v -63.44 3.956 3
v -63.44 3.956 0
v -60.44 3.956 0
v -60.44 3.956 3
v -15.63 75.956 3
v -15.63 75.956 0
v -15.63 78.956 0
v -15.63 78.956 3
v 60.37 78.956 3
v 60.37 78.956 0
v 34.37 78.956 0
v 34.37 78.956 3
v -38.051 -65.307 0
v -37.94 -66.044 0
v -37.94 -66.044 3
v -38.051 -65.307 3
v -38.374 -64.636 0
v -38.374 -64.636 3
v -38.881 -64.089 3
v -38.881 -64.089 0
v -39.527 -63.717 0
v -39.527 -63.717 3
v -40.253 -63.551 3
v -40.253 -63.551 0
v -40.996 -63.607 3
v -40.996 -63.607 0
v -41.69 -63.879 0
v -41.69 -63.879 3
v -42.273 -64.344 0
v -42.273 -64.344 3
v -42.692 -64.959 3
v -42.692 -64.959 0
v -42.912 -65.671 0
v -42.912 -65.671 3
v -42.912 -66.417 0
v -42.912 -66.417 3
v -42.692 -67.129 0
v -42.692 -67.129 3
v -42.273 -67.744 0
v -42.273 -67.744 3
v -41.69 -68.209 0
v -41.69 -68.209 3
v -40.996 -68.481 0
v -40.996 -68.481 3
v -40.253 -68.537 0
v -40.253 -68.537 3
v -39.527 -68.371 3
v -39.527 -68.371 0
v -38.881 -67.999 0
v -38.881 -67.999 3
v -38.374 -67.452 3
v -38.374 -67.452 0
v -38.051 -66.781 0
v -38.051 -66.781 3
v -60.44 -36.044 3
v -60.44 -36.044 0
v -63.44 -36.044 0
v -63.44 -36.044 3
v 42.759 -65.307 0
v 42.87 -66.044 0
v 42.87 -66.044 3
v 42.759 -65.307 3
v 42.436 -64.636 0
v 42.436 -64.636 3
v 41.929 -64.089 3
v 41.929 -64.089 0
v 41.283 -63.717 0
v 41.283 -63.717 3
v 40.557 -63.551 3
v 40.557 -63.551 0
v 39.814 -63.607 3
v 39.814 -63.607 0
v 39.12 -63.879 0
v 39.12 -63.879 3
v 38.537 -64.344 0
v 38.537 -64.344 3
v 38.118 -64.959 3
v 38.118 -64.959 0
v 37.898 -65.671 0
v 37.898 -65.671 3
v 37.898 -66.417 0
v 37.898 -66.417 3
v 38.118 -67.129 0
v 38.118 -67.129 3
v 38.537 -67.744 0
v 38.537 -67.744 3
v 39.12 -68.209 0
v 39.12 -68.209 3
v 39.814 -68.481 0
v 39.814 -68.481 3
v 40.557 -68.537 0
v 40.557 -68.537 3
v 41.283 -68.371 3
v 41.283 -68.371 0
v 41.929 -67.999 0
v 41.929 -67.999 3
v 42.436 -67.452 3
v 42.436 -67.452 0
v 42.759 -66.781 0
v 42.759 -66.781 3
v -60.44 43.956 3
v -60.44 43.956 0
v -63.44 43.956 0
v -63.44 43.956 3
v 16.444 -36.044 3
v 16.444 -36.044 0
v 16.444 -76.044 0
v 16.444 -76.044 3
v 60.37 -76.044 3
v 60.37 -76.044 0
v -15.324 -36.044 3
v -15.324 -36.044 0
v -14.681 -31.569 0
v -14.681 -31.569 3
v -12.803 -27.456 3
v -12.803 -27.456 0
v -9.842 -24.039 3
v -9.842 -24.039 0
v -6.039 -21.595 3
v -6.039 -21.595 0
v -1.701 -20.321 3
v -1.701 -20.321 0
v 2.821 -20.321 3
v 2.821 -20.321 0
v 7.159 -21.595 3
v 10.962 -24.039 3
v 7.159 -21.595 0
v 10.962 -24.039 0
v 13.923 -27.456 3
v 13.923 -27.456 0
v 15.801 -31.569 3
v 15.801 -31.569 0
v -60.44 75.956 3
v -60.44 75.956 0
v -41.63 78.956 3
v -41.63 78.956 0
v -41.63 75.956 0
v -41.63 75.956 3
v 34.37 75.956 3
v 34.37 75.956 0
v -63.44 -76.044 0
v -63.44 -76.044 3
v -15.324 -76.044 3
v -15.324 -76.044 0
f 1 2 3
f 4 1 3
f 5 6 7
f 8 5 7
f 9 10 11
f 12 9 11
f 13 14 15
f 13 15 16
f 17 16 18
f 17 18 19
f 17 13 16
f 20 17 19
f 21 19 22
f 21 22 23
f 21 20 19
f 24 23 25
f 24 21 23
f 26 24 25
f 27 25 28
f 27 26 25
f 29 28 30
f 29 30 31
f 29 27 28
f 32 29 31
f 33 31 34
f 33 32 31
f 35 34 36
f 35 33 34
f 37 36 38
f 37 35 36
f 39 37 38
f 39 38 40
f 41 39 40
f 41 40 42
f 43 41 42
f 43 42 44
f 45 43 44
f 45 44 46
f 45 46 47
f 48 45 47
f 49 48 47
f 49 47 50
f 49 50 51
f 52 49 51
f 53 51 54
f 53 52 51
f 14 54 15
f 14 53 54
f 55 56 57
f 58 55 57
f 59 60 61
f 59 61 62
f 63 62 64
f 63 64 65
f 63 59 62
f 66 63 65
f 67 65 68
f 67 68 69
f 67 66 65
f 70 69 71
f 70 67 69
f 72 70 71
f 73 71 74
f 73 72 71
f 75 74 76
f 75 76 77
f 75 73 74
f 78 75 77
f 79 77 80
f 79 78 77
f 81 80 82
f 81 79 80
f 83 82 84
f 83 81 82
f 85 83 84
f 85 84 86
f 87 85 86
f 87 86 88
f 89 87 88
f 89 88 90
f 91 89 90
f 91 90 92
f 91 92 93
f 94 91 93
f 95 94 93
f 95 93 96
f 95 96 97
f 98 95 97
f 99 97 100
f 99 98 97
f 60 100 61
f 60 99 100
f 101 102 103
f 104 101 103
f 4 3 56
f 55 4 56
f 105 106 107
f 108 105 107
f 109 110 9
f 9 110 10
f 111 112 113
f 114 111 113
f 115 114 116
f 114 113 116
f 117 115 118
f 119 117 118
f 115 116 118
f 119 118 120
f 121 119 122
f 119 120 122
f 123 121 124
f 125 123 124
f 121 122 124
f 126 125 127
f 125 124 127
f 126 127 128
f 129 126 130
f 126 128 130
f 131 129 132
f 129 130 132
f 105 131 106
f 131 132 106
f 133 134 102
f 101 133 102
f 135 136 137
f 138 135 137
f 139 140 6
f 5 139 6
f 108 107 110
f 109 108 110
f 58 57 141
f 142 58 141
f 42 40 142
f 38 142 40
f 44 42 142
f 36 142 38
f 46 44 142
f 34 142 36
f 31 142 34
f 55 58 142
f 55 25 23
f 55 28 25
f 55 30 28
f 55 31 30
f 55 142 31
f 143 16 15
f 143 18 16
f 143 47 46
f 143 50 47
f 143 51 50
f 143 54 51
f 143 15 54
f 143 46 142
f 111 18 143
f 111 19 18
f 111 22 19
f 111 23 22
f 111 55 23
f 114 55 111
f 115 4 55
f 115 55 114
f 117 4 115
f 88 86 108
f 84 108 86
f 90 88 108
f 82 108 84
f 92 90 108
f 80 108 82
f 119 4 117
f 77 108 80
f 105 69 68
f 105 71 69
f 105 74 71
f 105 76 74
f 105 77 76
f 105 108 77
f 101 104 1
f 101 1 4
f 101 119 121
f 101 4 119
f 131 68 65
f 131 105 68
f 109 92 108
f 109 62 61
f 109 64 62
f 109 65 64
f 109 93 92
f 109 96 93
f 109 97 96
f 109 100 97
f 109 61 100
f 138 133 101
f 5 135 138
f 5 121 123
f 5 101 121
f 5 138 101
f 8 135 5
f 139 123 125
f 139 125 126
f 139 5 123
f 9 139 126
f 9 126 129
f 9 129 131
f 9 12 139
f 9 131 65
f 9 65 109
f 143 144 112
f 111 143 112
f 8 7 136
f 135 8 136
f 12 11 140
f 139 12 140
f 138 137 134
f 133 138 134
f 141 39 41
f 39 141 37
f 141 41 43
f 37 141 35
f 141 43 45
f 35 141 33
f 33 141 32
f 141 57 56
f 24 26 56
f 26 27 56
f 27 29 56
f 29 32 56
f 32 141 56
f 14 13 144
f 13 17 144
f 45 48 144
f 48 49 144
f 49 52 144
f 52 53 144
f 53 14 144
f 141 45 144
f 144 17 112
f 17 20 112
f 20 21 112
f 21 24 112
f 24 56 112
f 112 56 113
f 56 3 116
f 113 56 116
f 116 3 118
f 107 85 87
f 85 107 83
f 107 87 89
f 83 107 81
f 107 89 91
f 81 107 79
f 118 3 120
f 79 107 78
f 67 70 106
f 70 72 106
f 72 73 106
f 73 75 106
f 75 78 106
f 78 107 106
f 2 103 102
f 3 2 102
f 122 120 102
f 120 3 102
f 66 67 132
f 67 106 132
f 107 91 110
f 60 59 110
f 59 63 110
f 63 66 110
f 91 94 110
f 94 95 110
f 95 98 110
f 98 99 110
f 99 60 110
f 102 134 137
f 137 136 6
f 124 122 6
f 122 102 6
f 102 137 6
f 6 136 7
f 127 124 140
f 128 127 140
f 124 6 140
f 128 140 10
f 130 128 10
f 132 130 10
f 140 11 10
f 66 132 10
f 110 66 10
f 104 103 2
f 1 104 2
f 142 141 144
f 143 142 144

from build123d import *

# Parameters (mm, degrees)
SKETCH1_R           = 2.5
BOSS_EXTRUDE1_DEPTH = 3


with BuildPart() as part:
    # Sketch1 → Boss-Extrude1 (new body)
    with BuildSketch(Plane.XY):
        with BuildLine():
            Line((34.37, 75.95596391), (-15.63, 75.95596391))
            Line((-15.63, 75.95596391), (-15.63, 78.95596391))
            Line((-15.63, 78.95596391), (-41.63, 78.95596391))
            Line((-41.63, 78.95596391), (-41.63, 75.95596391))
            Line((-41.63, 75.95596391), (-60.44, 75.95596391))
            Line((-60.44, 75.95596391), (-60.44, 43.95596391))
            Line((-60.44, 43.95596391), (-63.44, 43.95596391))
            Line((-63.44, 43.95596391), (-63.44, 3.95596391))
            Line((-63.44, 3.95596391), (-60.44, 3.95596391))
            Line((-60.44, 3.95596391), (-60.44, -36.04403609))
            Line((-60.44, -36.04403609), (-63.44, -36.04403609))
            Line((-63.44, -36.04403609), (-63.44, -76.04403609))
            Line((-63.44, -76.04403609), (-60.44, -76.04403609))
            Line((-60.44, -76.04403609), (-15.324347337, -76.04403609))
            Line((-15.324347337, -76.04403609), (-15.324347337, -36.04403609))
            ThreePointArc((-15.324347337, -36.04403609), (0.56, -20.159688753), (16.444347337, -36.04403609))
            Line((16.444347337, -36.04403609), (16.444347337, -76.04403609))
            Line((16.444347337, -76.04403609), (60.37, -76.04403609))
            Line((60.37, -76.04403609), (60.37, 75.95596391))
            Line((60.37, 75.95596391), (60.37, 78.95596391))
            Line((60.37, 78.95596391), (34.37, 78.95596391))
            Line((34.37, 78.95596391), (34.37, 75.95596391))
        make_face()
        with Locations((-40.44, -66.04403609)):
            Circle(SKETCH1_R, mode=Mode.SUBTRACT)
        with Locations((40.37, -66.04403609)):
            Circle(SKETCH1_R, mode=Mode.SUBTRACT)
    extrude(amount=BOSS_EXTRUDE1_DEPTH)


solid = part.part
